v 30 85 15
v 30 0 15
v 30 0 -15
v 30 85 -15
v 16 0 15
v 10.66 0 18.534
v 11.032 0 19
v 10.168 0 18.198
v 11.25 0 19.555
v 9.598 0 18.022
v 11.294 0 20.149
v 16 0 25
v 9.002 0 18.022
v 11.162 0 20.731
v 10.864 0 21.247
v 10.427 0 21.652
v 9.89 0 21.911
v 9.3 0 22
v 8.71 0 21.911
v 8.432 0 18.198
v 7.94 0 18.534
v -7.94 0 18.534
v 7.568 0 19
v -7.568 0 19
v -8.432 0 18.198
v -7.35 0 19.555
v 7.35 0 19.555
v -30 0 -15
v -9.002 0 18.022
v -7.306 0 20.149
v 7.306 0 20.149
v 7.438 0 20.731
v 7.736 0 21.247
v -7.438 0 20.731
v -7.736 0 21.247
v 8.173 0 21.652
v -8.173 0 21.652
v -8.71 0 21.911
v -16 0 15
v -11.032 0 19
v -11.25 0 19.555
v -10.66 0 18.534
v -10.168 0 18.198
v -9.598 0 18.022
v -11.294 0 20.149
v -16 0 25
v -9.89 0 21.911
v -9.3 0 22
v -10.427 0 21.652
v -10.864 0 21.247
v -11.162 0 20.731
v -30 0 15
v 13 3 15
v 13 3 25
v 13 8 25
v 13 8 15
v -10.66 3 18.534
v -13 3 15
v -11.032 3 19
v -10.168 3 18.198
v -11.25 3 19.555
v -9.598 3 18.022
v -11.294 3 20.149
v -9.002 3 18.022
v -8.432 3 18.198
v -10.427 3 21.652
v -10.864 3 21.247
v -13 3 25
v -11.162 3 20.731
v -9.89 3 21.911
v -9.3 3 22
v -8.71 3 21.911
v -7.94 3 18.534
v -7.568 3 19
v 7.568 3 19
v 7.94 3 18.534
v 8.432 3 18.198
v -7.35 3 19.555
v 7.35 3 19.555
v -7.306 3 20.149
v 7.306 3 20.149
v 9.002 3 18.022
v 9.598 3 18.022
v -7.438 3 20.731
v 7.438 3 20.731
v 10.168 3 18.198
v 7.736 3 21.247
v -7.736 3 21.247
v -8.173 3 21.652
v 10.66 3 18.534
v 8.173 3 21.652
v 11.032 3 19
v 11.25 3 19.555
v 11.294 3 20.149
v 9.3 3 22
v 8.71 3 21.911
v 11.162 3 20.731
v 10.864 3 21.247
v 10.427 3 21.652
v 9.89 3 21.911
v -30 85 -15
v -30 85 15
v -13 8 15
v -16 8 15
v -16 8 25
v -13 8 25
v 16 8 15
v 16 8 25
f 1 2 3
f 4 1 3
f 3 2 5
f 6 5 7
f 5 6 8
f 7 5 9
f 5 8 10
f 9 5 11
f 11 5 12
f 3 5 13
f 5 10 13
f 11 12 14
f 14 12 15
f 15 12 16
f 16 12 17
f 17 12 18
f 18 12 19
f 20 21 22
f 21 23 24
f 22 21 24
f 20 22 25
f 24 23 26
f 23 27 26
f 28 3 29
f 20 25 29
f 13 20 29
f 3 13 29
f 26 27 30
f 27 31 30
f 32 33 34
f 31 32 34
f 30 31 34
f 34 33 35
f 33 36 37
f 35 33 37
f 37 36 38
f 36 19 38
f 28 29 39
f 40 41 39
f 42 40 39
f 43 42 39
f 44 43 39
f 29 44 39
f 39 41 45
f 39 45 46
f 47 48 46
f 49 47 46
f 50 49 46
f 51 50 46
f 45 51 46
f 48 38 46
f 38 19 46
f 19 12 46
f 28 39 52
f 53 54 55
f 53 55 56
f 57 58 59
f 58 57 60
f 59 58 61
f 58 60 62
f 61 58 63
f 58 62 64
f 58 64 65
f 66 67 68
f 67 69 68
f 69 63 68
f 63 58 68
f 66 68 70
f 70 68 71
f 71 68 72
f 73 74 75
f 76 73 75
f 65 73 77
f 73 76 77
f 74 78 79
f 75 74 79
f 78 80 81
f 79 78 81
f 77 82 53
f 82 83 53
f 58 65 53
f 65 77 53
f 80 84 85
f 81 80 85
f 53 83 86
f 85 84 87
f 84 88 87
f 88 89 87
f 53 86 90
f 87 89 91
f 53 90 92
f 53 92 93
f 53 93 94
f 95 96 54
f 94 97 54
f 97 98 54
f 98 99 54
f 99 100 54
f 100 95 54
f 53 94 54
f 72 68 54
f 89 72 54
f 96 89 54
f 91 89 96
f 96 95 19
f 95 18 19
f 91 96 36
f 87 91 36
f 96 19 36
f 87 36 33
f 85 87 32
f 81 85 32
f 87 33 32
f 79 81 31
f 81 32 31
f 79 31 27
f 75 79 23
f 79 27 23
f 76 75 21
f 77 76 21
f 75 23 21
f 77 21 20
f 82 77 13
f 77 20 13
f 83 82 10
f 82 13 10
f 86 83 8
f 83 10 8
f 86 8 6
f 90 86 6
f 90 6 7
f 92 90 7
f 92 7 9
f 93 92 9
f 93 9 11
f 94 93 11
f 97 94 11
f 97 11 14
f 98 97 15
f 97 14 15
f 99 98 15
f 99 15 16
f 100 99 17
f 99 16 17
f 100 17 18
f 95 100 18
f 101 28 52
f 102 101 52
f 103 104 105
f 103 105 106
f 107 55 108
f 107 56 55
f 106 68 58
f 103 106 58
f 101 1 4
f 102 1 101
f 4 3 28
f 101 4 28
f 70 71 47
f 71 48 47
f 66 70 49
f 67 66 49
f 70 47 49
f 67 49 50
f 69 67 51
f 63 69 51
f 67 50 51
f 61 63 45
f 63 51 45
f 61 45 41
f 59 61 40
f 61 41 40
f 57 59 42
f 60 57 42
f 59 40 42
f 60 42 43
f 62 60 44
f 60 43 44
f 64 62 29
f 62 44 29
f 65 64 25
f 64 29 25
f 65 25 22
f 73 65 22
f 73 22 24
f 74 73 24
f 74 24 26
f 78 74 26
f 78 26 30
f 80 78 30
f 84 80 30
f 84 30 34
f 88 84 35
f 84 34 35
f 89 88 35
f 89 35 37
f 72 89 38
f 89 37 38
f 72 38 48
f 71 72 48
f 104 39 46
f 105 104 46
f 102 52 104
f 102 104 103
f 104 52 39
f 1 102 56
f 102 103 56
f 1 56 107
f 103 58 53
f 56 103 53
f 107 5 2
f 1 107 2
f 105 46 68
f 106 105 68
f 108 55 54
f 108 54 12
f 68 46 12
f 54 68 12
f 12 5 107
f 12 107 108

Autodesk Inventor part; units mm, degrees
ref_plane "YZ Plane" through (0, 0, 0) normal (1, 0, 0) x (0, 1, 0)
ref_plane "XZ Plane" through (0, 0, 0) normal (0, 1, 0) x (-1, 0, 0)
ref_plane "XY Plane" through (0, 0, 0) normal (0, 0, 1) x (1, 0, 0)
sketch "スケッチ1" plane through (0, 0, 0) normal (0, 1, 0) x (-1, 0, 0)
  line L0 (30, 15) -> (-30, 15)
  line L1 (-30, 15) -> (-30, -15)
  line L2 (-30, -15) -> (30, -15)
  line L3 (30, -15) -> (30, 15)
  line L4 (30, 15) -> (-30, -15) construction
  line L5 (-30, 15) -> (30, -15) construction
  point P0 (0, 0)
  dimension "d0" = 60
  dimension "d1" = 30
extrude "押し出し1" add sketch "スケッチ1" along normal blind 85
sketch "スケッチ2" plane through (0, 0, 0) normal (0, -1, 0) x (1, 0, 0)
  line L0 (16, 5) -> (-16, 5)
  line L1 (-16, 5) -> (-16, 25)
  line L2 (-16, 25) -> (16, 25)
  line L3 (16, 25) -> (16, 5)
  line L4 (-30, 15) -> (30, 15) projected
  line L5 (16, 5) -> (-16, 25) construction
  line L6 (-16, 5) -> (16, 25) construction
  point P0 (0, 0)
  point P1 (0, 15)
  point P2 (-16, 15)
  point P3 (16, 15)
  dimension "d4" = 32
  dimension "d5" = 20
extrude "押し出し2" add sketch "スケッチ2" against normal blind 3 contours L4 L1 L2 L3
sketch "スケッチ3" plane through (0, 3, 0) normal (0, 1, 0) x (1, 0, 0)
  line L0 (-16, -25) -> (16, -25) projected
  line L1 (-30, -15) -> (30, -15) projected
  line L2 (16, -25) -> (13, -25)
  line L3 (13, -25) -> (13, -15)
  line L4 (13, -15) -> (16, -15)
  line L5 (16, -15) -> (16, -25)
  line L6 (-16, -15) -> (-16, -25) projected
  line L7 (-16, -25) -> (-13, -25)
  line L8 (-13, -25) -> (-13, -15)
  line L9 (-13, -15) -> (-16, -15)
  line L10 (-16, -15) -> (-16, -25)
  point P0 (0, 0)
  point P1 (-13, -25)
  point P2 (-13, -15)
  point P3 (16, -15)
  dimension "d8" = 3
  dimension "d9" = 3
extrude "押し出し3" add sketch "スケッチ3" along normal blind 5 contours L6 L1 L8 L0 | L3 L1 L5 L0
sketch "スケッチ4" plane through (0, 3, 0) normal (0, 1, 0) x (1, 0, 0)
  line L0 (13, -25) -> (16, -25) projected
  line L1 (-13, -15) -> (-13, -25) projected
  line L2 (13, -25) -> (-13, -25)
  line L3 (-13, -25) -> (-13, -20)
  line L4 (-13, -20) -> (13, -20)
  line L5 (13, -20) -> (13, -25)
  line L6 (-13, -15) -> (13, -15) projected
  line L7 (9.3, -25) -> (-9.3, -25)
  line L8 (-9.3, -25) -> (-9.3, -15)
  line L9 (-9.3, -15) -> (9.3, -15)
  line L10 (9.3, -15) -> (9.3, -25)
  line L11 (9.3, -25) -> (-9.3, -15) construction
  line L12 (-9.3, -25) -> (9.3, -15) construction
  point P0 (0, 0)
  point P1 (0, -20)
  point P2 (9.3, -20)
  point P3 (-9.3, -20)
  dimension "d12" = 5
  dimension "d13" = 18.6
hole "穴1" at (9.3, 3, 20) at (-9.3, 3, 20) direction (0, -1, 0) diameter 4 end through all
properties part number "_3D プリント"
